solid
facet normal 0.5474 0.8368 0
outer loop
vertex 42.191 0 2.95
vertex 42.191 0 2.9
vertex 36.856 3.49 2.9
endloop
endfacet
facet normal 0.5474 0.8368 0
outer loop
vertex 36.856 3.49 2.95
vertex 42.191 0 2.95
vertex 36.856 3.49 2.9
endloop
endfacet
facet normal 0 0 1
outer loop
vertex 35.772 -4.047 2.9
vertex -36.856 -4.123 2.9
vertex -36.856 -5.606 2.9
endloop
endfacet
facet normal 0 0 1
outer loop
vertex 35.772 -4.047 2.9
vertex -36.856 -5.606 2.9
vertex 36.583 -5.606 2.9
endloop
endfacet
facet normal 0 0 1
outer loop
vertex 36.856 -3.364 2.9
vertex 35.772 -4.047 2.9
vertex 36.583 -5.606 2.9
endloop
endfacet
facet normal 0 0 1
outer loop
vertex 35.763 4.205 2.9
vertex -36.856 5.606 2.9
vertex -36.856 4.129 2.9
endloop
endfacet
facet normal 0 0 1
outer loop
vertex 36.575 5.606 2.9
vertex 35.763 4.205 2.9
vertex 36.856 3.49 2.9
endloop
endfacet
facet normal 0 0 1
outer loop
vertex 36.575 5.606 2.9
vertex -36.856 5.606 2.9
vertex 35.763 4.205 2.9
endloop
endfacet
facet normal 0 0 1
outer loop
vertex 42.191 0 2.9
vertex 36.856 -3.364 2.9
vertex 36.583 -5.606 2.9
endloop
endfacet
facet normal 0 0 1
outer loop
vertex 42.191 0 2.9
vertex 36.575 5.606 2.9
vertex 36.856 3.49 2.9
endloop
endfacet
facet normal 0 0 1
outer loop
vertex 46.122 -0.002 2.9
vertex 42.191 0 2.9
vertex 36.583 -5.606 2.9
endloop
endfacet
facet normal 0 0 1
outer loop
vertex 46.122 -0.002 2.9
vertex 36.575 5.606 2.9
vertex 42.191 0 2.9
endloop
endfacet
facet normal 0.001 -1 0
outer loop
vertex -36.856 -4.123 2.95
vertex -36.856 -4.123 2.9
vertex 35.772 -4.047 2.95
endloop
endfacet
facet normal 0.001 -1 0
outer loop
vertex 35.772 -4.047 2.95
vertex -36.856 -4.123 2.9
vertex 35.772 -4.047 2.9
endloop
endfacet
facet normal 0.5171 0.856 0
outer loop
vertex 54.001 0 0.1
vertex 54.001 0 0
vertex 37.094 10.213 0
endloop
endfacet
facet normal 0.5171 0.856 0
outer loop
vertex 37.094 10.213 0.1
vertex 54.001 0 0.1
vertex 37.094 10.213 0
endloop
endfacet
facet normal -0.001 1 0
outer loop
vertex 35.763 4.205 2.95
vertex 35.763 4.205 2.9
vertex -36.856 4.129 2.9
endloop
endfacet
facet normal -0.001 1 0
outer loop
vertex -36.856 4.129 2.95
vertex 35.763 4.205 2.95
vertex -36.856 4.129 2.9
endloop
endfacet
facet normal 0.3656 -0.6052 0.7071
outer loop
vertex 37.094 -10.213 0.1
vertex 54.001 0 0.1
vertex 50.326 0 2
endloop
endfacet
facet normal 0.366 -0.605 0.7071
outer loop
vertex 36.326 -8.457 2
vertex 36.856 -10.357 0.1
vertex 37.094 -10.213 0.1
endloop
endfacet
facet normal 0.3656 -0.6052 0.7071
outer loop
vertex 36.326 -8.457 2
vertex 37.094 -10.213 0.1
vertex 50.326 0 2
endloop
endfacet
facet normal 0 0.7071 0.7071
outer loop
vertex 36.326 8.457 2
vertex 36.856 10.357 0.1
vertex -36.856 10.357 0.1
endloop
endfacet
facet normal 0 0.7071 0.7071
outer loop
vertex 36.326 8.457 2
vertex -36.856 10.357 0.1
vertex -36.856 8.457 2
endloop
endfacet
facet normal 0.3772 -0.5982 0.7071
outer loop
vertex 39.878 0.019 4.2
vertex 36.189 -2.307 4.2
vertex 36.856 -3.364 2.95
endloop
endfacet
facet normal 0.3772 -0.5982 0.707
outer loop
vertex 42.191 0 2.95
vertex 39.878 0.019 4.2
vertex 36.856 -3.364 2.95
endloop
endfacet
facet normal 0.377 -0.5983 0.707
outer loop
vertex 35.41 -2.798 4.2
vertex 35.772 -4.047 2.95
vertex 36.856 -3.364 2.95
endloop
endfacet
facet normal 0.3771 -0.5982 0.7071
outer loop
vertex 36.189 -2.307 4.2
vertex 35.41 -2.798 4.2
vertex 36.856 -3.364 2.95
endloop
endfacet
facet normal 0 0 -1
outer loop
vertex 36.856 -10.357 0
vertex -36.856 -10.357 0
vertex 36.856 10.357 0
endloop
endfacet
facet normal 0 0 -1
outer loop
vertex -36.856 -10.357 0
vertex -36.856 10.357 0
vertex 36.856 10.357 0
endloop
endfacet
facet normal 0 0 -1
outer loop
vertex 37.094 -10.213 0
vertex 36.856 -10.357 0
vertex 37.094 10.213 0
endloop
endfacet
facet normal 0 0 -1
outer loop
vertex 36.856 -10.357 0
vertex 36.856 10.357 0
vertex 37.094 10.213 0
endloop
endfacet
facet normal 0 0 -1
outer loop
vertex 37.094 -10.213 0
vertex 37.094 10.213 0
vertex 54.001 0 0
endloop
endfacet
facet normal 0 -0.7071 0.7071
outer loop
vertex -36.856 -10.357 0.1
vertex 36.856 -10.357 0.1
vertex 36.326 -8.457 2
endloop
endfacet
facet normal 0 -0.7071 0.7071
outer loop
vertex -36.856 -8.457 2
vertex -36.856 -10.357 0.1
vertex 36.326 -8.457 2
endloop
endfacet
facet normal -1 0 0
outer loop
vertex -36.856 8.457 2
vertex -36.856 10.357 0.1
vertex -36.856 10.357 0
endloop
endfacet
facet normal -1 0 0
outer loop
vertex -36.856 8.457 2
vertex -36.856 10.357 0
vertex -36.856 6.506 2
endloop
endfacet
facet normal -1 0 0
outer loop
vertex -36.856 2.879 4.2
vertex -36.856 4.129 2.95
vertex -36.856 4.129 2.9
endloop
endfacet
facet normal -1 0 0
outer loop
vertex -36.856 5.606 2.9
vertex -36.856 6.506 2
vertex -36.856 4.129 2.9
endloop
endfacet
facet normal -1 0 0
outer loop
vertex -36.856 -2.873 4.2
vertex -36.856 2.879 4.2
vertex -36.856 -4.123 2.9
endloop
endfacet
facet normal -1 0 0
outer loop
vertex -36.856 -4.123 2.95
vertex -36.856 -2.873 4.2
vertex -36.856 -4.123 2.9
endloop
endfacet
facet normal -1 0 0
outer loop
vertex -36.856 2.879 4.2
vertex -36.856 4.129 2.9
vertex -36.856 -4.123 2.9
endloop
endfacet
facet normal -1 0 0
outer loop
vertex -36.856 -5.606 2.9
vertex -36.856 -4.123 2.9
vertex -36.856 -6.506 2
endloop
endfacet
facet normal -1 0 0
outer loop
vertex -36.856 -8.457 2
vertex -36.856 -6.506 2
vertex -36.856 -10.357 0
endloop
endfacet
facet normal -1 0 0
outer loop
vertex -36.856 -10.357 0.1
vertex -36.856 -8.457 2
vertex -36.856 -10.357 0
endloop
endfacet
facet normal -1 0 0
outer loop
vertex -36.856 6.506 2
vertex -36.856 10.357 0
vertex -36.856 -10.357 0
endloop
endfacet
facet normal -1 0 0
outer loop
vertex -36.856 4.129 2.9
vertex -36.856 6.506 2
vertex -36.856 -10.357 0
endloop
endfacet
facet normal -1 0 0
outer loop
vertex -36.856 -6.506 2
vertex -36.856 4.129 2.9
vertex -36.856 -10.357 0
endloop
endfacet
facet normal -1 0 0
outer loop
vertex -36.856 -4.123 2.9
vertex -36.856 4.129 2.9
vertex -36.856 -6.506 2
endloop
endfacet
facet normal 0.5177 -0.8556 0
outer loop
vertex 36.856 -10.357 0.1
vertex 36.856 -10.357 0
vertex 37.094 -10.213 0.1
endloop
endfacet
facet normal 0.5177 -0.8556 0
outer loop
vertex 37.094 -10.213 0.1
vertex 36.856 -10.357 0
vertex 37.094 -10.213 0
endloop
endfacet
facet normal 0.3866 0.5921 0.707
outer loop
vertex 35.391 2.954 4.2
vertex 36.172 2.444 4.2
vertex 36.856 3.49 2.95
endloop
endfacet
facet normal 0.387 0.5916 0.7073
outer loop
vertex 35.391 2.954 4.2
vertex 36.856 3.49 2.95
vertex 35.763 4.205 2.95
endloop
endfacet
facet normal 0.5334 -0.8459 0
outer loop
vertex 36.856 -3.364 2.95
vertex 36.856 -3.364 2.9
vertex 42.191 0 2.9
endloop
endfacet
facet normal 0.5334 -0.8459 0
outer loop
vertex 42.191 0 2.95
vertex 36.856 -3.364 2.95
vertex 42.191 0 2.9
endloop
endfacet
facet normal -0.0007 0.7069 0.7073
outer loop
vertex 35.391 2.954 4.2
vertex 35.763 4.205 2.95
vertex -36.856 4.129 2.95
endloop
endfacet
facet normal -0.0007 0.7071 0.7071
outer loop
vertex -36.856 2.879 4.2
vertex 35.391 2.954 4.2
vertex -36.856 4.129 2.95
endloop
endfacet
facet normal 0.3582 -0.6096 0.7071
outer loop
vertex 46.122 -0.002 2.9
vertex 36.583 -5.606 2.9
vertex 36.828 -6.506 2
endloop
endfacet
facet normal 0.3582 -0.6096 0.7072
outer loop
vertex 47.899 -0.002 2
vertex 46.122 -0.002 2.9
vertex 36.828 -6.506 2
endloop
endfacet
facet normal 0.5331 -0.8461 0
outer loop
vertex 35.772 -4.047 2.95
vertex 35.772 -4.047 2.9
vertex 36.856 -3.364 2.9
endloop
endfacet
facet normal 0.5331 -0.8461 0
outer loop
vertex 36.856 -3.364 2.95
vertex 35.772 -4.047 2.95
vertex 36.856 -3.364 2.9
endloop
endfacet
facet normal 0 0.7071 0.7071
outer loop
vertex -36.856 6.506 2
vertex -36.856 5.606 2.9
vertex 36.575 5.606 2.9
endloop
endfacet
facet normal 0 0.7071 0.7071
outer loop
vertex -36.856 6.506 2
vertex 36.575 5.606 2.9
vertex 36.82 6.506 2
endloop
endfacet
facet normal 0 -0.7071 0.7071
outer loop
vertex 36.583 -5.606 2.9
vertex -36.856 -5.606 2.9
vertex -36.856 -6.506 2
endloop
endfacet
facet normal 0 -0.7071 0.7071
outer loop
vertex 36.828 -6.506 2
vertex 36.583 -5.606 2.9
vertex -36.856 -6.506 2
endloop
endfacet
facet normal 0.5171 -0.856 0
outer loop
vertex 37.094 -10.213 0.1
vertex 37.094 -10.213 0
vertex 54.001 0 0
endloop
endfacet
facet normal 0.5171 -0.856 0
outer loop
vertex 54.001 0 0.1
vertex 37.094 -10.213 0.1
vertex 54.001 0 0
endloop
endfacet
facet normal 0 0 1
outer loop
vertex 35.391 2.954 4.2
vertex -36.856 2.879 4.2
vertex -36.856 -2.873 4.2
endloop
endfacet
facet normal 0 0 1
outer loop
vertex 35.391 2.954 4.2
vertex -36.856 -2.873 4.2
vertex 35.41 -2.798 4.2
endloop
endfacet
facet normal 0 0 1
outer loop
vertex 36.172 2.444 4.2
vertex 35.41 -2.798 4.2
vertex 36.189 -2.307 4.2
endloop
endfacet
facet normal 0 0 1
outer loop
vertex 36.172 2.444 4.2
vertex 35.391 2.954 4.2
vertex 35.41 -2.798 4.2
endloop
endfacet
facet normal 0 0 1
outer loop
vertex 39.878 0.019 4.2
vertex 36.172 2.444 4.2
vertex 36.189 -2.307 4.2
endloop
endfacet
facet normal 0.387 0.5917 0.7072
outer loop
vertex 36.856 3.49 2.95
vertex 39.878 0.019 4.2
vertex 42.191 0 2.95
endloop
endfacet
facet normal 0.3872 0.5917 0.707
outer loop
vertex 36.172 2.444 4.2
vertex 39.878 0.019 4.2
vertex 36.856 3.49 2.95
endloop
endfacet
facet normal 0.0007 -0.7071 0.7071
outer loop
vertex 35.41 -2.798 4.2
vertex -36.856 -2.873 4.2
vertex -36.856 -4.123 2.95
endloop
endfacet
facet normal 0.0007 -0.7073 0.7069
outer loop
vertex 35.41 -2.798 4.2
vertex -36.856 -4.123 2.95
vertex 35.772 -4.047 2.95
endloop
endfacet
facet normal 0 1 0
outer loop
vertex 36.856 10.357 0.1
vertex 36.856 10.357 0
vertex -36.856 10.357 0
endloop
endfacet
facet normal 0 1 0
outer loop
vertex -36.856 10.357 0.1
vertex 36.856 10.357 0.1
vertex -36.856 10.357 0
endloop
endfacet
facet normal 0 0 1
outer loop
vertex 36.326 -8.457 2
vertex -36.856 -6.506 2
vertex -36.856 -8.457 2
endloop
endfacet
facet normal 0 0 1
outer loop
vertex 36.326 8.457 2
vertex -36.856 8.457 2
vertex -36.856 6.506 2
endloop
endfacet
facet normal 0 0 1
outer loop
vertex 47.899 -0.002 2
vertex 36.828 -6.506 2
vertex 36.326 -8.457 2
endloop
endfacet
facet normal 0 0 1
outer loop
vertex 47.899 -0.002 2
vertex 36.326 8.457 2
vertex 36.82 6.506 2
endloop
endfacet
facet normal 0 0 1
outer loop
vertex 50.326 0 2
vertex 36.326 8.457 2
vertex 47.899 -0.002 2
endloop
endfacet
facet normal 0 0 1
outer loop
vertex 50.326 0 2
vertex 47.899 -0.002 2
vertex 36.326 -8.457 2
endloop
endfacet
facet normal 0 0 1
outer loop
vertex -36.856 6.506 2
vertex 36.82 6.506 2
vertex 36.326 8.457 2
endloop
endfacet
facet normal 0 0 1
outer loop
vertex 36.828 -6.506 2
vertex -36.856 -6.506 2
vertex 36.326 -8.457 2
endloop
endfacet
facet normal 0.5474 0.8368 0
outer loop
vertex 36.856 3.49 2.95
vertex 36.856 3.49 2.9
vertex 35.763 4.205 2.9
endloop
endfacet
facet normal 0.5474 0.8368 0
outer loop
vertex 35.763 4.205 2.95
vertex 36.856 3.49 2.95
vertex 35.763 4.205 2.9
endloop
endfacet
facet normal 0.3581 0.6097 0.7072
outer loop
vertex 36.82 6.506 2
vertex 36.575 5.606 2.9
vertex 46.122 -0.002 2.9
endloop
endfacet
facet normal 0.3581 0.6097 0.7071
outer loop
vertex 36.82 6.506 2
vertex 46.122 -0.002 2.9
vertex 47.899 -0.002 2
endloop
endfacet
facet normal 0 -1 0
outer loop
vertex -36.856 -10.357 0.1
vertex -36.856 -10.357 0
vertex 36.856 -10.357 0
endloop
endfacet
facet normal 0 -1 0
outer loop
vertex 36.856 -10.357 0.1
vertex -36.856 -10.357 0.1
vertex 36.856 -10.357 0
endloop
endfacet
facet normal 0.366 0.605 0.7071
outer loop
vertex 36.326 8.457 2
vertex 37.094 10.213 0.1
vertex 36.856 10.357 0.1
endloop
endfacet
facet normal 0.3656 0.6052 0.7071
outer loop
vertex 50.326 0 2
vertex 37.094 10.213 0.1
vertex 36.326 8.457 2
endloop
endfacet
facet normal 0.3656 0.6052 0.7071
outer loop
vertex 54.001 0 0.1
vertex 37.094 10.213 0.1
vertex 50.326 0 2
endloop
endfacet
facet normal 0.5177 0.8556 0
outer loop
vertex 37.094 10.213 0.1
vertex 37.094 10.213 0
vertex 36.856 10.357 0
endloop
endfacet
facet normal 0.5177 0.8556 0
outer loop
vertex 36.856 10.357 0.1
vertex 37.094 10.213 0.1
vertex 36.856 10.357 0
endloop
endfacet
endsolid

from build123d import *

# Parameters (mm, degrees)
F1_DEPTH     = 2
F2_DEPTH     = 2.9
F3_DEPTH     = 4.2
F4_SIZE      = 1.25
F5_T4_DEPTH  = 18.1896245494
F5_T9_DEPTH  = 18.1809539711
F5_T14_DEPTH = 78.8540359797
F5_T19_DEPTH = 78.8465601363
F6_T1_DEPTH  = 29.8027354216
F6_T3_DEPTH  = 83.4838874755
F6_T5_DEPTH  = 29.8027354216


# Not quite as in the source:
# - a fillet or chamfer that OpenCascade refuses, or shapes differently, is made with other operations: its cross-section is extruded or revolved along the edge and cut away or added


with BuildPart() as f1:
    # F0 (on Top) → F1 (new body)
    with BuildSketch(Plane.XY):
        Polygon((-36.8557460606, 10.3569319472), (-36.8557460606, 6.6064400598), (36.8474480997, 6.6064400598), (36.8557460606, 6.6015649421), (36.8557460606, 10.3569319472), (36.5771486739, 10.3569319472), align=None)
        Polygon((-36.8557460606, -10.3569319472), (36.5771486739, -10.3569319472), (36.8557460606, -10.3569319472), (36.8557460606, -6.6059570593), (36.8549239432, -6.6064400598), (-36.8557460606, -6.6064400598), align=None)
        Polygon((48.0923008195, 0), (54.000671953, 0), (37.0942108861, 10.2128797661), (36.8557460606, 10.3569319472), (36.8557460606, 6.6015649421), align=None)
        Polygon((36.8557460606, -6.6059570593), (36.8557460606, -10.3569319472), (37.0942108861, -10.2128797661), (54.000671953, 0), (48.0923008195, 0), (48.0960387413, -0.0021960586), align=None)
    extrude(amount=F1_DEPTH)

    # F0 (on Top) → F2 (join)
    with BuildSketch(Plane.XY):
        Polygon((-36.8557460606, -4.1234174278), (-36.8557460606, -6.6064400598), (36.8549239432, -6.6064400598), (36.8557460606, -6.6059570593), (36.8557460606, -3.3639193541), (35.7716211712, -4.0474131238), align=None)
        Polygon((36.8557460606, -3.3639193541), (36.8557460606, -6.6059570593), (48.0960387413, -0.0021960586), (48.0923008195, 0), (42.1914328796, 0), align=None)
        Polygon((-36.8557460606, 6.6064400598), (-36.8557460606, 4.1285937186), (35.7628105821, 4.2045980226), (36.8557460606, 3.4897707798), (36.8557460606, 6.6015649421), (36.8474480997, 6.6064400598), align=None)
        Polygon((36.8557460606, 3.4897707798), (42.1914328796, 0), (48.0923008195, 0), (36.8557460606, 6.6015649421), align=None)
    extrude(amount=F2_DEPTH)

    # F0 (on Top) → F3 (join)
    with BuildSketch(Plane.XY):
        Polygon((-36.8557460606, 4.1285937186), (-36.8557460606, -4.1234174278), (35.7716211712, -4.0474131238), (36.8557460606, -3.3639193541), (36.8557460606, 0), (36.8557460606, 3.4897707798), (35.7628105821, 4.2045980226), align=None)
        Polygon((36.8557460606, 0), (36.8557460606, -3.3639193541), (42.1914328796, 0), align=None)
        Polygon((36.8557460606, 3.4897707798), (36.8557460606, 0), (42.1914328796, 0), align=None)
    extrude(amount=F3_DEPTH)

    # F4
    f4_edges = [f1.edges().sort_by_distance(p)[0] for p in [
        (38.981527, -2.023707, 4.2),
        (-0.542062, -4.085415, 4.2),
        (38.977122, 2.102299, 4.2),
        (-0.546468, 4.166596, 4.2),
    ]]
    chamfer(f4_edges, length=F4_SIZE)

    # F5: chamfer of 1 on 4 edges, made by hand


with BuildPart() as f5_tool2:
    # F5_s3 → F5_t4 (new body)
    with BuildSketch(Plane(origin=(37.9730206881, -22.3094504942, 0), x_dir=(0, 0, 1), z_dir=(-0.8622081632, 0.5065541267, 0))):
        Polygon((2.9, 23.3613534429), (1.9, 24.3613534429), (2.9, 24.3613534429), align=None)
    extrude(amount=F5_T4_DEPTH)

    split(bisect_by=Plane.XY.offset(2), keep=Keep.TOP)


with BuildPart() as f1_1:
    add(f1.part)

    # F5_t1: cut F5_tool2
    add(f5_tool2.part, mode=Mode.SUBTRACT)


with BuildPart() as f5_tool7:
    # F5_s8 → F5_t9 (new body)
    with BuildSketch(Plane(origin=(22.2953354795, 13.0986862283, 0), x_dir=(0, 0, 1), z_dir=(0.8622081632, 0.5065541267, 0))):
        Polygon((2.9, 23.3651403622), (1.9, 24.3651403622), (2.9, 24.3651403622), align=None)
    extrude(amount=F5_T9_DEPTH)

    split(bisect_by=Plane.XY.offset(2), keep=Keep.TOP)


with BuildPart() as f1_2:
    add(f1_1.part)

    # F5_t6: cut F5_tool7
    add(f5_tool7.part, mode=Mode.SUBTRACT)


with BuildPart() as f5_tool12:
    # F5_s13 → F5_t14 (new body)
    with BuildSketch(Plane.YZ.offset(-39.4274290486)):
        Polygon((-5.6064400598, 2.9), (-6.6064400598, 1.9), (-6.6064400598, 2.9), align=None)
    extrude(amount=F5_T14_DEPTH)

    split(bisect_by=Plane.XY.offset(2), keep=Keep.TOP)


with BuildPart() as f1_3:
    add(f1_2.part)

    # F5_t11: cut F5_tool12
    add(f5_tool12.part, mode=Mode.SUBTRACT)


with BuildPart() as f5_tool17:
    # F5_s18 → F5_t19 (new body)
    with BuildSketch(Plane.YZ.offset(39.4191310877)):
        Polygon((5.6064400598, 2.9), (6.6064400598, 1.9), (6.6064400598, 2.9), align=None)
    extrude(amount=-F5_T19_DEPTH)

    split(bisect_by=Plane.XY.offset(2), keep=Keep.TOP)


with BuildPart() as f1_4:
    add(f1_3.part)

    # F5_t16: cut F5_tool17
    add(f5_tool17.part, mode=Mode.SUBTRACT)

    # F6: chamfer of 1.9 on 4 edges, made by hand

    # F6_s2 → F6_t1 (cut)
    with BuildSketch(Plane(origin=(43.7457426568, -26.4259923035, 0), x_dir=(0, 0, 1), z_dir=(-0.8559478189, 0.5170622122, 0))):
        Polygon((0.1, 27.9217069026), (2, 26.0217069026), (2, 27.9217069026), align=None)
    extrude(amount=F6_T1_DEPTH, mode=Mode.SUBTRACT)

    # F6_s4 → F6_t3 (cut)
    with BuildSketch(Plane.YZ.offset(-41.7419437377)):
        Polygon((10.3569319472, 0.1), (8.4569319472, 2), (10.3569319472, 2), align=None)
        Polygon((-10.3569319472, 0.1), (-8.4569319472, 2), (-10.3569319472, 2), align=None)
    extrude(amount=F6_T3_DEPTH, mode=Mode.SUBTRACT)

    # F6_s6 → F6_t5 (cut)
    with BuildSketch(Plane(origin=(18.2361562756, 11.0161239955, 0), x_dir=(0, 0, 1), z_dir=(0.8559478189, 0.5170622122, 0))):
        Polygon((0.1, 27.9217069026), (2, 26.0217069026), (2, 27.9217069026), align=None)
    extrude(amount=F6_T5_DEPTH, mode=Mode.SUBTRACT)


solid = f1_4.part
